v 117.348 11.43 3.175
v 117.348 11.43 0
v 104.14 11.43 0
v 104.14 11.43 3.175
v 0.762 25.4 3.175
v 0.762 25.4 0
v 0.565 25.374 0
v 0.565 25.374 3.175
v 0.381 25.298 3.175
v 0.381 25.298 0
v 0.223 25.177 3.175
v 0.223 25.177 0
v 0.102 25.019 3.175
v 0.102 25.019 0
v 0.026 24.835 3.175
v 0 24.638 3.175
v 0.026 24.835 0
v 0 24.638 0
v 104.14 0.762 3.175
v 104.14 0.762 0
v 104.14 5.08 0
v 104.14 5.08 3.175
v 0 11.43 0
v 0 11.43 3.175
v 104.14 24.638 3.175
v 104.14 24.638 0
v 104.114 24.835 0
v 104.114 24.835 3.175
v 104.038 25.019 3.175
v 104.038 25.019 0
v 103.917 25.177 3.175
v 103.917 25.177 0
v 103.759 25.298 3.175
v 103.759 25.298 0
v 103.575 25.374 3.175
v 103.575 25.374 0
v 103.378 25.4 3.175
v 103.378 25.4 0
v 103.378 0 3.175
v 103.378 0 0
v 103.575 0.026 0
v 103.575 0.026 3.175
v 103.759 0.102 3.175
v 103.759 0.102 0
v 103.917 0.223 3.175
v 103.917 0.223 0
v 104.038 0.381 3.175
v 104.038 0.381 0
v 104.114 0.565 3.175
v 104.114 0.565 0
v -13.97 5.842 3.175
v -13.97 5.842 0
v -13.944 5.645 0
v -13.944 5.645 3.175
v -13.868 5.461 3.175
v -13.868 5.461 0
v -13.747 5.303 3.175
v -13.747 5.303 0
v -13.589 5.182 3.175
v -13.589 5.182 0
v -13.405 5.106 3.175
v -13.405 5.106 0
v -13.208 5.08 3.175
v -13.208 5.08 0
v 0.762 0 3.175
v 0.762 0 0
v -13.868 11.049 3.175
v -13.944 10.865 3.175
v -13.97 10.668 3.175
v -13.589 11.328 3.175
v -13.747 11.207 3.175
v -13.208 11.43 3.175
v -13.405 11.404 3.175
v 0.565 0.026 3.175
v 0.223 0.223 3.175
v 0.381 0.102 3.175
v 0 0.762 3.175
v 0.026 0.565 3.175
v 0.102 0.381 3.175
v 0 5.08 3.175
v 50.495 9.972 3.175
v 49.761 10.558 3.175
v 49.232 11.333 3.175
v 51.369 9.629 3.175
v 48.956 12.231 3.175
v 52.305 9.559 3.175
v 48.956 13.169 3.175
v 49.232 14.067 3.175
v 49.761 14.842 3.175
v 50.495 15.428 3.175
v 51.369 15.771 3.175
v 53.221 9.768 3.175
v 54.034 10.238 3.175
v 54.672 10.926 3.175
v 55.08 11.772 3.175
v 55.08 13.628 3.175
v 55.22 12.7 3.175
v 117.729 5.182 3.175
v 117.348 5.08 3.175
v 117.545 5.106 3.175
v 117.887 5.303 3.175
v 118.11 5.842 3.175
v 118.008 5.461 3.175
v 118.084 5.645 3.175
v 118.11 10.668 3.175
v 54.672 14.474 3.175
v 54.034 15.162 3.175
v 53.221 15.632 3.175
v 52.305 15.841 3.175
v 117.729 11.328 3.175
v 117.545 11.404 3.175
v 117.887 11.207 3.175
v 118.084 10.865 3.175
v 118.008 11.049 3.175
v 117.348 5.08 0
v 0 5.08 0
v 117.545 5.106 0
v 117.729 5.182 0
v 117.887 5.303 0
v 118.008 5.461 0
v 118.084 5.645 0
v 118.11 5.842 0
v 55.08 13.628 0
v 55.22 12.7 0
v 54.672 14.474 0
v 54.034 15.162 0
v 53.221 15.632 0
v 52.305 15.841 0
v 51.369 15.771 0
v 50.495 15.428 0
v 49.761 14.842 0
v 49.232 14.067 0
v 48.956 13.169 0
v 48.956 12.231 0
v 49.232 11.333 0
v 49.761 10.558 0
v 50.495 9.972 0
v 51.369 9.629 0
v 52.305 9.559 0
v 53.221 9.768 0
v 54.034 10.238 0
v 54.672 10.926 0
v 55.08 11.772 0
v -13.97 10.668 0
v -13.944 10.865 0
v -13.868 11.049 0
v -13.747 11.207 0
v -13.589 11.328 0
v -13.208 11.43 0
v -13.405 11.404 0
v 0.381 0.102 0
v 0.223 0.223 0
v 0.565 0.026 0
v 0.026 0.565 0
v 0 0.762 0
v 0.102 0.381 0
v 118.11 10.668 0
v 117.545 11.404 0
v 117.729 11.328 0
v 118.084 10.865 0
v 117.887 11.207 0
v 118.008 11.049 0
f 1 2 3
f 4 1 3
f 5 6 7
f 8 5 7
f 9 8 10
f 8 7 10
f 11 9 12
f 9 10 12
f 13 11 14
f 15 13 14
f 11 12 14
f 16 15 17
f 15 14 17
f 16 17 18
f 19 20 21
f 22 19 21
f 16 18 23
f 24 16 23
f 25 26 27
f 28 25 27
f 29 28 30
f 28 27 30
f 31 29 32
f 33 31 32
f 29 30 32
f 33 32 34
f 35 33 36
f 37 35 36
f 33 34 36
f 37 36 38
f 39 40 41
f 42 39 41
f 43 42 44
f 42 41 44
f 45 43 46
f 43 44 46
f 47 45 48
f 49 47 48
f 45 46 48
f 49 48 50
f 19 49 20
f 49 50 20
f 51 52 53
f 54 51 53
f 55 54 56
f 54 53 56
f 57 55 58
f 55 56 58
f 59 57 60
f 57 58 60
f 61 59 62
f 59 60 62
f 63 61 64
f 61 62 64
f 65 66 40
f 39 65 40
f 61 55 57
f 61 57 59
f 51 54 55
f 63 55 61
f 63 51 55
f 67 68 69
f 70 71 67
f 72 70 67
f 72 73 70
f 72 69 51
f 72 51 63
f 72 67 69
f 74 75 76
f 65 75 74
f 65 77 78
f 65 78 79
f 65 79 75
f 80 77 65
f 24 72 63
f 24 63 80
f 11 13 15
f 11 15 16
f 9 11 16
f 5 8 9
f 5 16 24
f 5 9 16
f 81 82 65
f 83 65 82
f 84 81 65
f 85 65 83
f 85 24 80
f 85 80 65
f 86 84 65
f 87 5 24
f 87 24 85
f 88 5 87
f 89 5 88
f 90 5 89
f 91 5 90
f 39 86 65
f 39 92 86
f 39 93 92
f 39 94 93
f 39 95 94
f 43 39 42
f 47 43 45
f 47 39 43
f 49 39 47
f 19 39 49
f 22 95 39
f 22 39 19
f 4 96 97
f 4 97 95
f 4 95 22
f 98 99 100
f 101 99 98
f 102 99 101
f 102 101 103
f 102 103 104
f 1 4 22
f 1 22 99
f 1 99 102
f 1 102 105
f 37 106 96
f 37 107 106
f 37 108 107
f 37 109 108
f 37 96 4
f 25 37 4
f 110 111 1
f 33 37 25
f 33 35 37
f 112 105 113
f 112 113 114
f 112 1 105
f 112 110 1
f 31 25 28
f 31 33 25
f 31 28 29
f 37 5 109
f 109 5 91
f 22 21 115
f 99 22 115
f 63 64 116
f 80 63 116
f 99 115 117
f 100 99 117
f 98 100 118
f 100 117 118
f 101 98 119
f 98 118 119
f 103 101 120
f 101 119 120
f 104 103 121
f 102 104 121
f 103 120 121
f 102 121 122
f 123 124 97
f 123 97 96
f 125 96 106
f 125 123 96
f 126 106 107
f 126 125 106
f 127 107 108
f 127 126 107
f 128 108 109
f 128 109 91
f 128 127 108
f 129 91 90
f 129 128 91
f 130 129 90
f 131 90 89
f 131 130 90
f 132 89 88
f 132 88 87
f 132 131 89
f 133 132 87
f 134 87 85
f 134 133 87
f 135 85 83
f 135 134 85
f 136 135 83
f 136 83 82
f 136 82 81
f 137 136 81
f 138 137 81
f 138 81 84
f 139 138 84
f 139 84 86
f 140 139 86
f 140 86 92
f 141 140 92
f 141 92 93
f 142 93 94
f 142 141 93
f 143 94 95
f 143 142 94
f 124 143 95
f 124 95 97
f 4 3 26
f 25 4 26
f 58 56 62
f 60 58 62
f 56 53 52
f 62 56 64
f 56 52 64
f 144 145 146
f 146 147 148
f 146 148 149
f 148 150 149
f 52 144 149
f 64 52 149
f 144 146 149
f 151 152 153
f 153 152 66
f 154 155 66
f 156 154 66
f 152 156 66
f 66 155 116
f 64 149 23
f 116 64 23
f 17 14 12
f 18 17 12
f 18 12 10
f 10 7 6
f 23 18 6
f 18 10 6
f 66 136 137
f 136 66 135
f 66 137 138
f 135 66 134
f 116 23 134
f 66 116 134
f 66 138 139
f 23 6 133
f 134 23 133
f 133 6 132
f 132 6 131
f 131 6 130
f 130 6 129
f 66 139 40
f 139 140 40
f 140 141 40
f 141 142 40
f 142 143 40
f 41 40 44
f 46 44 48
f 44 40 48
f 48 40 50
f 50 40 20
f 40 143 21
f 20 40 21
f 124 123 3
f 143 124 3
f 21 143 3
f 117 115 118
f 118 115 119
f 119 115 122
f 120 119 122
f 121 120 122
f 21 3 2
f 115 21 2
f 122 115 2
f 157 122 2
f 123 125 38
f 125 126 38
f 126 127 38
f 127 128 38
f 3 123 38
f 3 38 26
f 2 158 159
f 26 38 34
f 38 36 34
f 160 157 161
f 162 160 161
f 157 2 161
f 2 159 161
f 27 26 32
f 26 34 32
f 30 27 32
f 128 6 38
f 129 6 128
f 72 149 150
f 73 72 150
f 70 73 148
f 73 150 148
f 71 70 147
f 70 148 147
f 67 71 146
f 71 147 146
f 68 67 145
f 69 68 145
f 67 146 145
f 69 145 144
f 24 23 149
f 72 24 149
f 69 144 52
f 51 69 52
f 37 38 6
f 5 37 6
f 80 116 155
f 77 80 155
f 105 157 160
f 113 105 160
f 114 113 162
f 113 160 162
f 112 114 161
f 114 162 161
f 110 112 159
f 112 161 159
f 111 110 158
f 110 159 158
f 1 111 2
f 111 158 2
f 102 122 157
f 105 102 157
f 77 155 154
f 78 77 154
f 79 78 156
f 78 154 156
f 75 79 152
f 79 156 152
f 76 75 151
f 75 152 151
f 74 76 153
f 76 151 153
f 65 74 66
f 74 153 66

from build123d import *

# Parameters (mm, degrees)
SKETCH1_R           = 3.1496
BOSS_EXTRUDE1_DEPTH = 3.175


with BuildPart() as part:
    # Sketch1 → Boss-Extrude1 (new body)
    with BuildSketch(Plane.XY):
        with BuildLine():
            Line((0.762, 0), (103.378, 0))
            ThreePointArc((103.378, 0), (103.916815367, 0.223184633), (104.14, 0.762))
            Line((104.14, 0.762), (104.14, 5.08))
            Line((104.14, 5.08), (117.348, 5.08))
            ThreePointArc((117.348, 5.08), (117.886815367, 5.303184633), (118.11, 5.842))
            Line((118.11, 5.842), (118.11, 10.668))
            ThreePointArc((118.11, 10.668), (117.886815367, 11.206815367), (117.348, 11.43))
            Line((117.348, 11.43), (104.14, 11.43))
            Line((104.14, 11.43), (104.14, 24.638))
            ThreePointArc((104.14, 24.638), (103.916815367, 25.176815367), (103.378, 25.4))
            Line((103.378, 25.4), (0.762, 25.4))
            ThreePointArc((0.762, 25.4), (0.223184633, 25.176815367), (0, 24.638))
            Line((0, 24.638), (0, 11.43))
            Line((0, 11.43), (-13.208, 11.43))
            ThreePointArc((-13.208, 11.43), (-13.746815367, 11.206815367), (-13.97, 10.668))
            Line((-13.97, 10.668), (-13.97, 5.842))
            ThreePointArc((-13.97, 5.842), (-13.746815367, 5.303184633), (-13.208, 5.08))
            Line((-13.208, 5.08), (0, 5.08))
            Line((0, 5.08), (0, 0.762))
            ThreePointArc((0, 0.762), (0.223184633, 0.223184633), (0.762, 0))
        make_face()
        with Locations((52.07, 12.7)):
            Circle(SKETCH1_R, mode=Mode.SUBTRACT)
    extrude(amount=BOSS_EXTRUDE1_DEPTH)


solid = part.part
